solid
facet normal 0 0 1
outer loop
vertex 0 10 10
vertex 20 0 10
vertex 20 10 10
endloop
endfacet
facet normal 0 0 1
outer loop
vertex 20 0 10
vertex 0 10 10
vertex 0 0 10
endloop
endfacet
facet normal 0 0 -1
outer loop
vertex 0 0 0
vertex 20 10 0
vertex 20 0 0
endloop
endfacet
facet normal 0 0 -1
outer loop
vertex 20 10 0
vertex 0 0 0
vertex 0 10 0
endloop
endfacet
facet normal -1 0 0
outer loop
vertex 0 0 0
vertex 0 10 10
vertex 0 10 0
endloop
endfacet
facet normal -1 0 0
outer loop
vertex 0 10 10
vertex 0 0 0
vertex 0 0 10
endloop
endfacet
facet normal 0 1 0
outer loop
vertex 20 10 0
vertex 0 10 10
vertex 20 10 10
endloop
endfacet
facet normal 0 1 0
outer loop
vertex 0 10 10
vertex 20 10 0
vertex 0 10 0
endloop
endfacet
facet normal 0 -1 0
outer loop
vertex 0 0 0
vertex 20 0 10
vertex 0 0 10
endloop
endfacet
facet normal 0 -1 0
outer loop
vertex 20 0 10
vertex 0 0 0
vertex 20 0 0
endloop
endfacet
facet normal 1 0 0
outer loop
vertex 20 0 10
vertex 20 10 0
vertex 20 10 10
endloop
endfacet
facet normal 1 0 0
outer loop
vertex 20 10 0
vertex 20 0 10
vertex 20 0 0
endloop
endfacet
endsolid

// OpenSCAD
// The exact-geometry audit's case c09 (docs/audits/exact-geometry-rust.md).
// volume: 2000.0
union() { cube(10); translate([10,0,0]) cube(10); }
